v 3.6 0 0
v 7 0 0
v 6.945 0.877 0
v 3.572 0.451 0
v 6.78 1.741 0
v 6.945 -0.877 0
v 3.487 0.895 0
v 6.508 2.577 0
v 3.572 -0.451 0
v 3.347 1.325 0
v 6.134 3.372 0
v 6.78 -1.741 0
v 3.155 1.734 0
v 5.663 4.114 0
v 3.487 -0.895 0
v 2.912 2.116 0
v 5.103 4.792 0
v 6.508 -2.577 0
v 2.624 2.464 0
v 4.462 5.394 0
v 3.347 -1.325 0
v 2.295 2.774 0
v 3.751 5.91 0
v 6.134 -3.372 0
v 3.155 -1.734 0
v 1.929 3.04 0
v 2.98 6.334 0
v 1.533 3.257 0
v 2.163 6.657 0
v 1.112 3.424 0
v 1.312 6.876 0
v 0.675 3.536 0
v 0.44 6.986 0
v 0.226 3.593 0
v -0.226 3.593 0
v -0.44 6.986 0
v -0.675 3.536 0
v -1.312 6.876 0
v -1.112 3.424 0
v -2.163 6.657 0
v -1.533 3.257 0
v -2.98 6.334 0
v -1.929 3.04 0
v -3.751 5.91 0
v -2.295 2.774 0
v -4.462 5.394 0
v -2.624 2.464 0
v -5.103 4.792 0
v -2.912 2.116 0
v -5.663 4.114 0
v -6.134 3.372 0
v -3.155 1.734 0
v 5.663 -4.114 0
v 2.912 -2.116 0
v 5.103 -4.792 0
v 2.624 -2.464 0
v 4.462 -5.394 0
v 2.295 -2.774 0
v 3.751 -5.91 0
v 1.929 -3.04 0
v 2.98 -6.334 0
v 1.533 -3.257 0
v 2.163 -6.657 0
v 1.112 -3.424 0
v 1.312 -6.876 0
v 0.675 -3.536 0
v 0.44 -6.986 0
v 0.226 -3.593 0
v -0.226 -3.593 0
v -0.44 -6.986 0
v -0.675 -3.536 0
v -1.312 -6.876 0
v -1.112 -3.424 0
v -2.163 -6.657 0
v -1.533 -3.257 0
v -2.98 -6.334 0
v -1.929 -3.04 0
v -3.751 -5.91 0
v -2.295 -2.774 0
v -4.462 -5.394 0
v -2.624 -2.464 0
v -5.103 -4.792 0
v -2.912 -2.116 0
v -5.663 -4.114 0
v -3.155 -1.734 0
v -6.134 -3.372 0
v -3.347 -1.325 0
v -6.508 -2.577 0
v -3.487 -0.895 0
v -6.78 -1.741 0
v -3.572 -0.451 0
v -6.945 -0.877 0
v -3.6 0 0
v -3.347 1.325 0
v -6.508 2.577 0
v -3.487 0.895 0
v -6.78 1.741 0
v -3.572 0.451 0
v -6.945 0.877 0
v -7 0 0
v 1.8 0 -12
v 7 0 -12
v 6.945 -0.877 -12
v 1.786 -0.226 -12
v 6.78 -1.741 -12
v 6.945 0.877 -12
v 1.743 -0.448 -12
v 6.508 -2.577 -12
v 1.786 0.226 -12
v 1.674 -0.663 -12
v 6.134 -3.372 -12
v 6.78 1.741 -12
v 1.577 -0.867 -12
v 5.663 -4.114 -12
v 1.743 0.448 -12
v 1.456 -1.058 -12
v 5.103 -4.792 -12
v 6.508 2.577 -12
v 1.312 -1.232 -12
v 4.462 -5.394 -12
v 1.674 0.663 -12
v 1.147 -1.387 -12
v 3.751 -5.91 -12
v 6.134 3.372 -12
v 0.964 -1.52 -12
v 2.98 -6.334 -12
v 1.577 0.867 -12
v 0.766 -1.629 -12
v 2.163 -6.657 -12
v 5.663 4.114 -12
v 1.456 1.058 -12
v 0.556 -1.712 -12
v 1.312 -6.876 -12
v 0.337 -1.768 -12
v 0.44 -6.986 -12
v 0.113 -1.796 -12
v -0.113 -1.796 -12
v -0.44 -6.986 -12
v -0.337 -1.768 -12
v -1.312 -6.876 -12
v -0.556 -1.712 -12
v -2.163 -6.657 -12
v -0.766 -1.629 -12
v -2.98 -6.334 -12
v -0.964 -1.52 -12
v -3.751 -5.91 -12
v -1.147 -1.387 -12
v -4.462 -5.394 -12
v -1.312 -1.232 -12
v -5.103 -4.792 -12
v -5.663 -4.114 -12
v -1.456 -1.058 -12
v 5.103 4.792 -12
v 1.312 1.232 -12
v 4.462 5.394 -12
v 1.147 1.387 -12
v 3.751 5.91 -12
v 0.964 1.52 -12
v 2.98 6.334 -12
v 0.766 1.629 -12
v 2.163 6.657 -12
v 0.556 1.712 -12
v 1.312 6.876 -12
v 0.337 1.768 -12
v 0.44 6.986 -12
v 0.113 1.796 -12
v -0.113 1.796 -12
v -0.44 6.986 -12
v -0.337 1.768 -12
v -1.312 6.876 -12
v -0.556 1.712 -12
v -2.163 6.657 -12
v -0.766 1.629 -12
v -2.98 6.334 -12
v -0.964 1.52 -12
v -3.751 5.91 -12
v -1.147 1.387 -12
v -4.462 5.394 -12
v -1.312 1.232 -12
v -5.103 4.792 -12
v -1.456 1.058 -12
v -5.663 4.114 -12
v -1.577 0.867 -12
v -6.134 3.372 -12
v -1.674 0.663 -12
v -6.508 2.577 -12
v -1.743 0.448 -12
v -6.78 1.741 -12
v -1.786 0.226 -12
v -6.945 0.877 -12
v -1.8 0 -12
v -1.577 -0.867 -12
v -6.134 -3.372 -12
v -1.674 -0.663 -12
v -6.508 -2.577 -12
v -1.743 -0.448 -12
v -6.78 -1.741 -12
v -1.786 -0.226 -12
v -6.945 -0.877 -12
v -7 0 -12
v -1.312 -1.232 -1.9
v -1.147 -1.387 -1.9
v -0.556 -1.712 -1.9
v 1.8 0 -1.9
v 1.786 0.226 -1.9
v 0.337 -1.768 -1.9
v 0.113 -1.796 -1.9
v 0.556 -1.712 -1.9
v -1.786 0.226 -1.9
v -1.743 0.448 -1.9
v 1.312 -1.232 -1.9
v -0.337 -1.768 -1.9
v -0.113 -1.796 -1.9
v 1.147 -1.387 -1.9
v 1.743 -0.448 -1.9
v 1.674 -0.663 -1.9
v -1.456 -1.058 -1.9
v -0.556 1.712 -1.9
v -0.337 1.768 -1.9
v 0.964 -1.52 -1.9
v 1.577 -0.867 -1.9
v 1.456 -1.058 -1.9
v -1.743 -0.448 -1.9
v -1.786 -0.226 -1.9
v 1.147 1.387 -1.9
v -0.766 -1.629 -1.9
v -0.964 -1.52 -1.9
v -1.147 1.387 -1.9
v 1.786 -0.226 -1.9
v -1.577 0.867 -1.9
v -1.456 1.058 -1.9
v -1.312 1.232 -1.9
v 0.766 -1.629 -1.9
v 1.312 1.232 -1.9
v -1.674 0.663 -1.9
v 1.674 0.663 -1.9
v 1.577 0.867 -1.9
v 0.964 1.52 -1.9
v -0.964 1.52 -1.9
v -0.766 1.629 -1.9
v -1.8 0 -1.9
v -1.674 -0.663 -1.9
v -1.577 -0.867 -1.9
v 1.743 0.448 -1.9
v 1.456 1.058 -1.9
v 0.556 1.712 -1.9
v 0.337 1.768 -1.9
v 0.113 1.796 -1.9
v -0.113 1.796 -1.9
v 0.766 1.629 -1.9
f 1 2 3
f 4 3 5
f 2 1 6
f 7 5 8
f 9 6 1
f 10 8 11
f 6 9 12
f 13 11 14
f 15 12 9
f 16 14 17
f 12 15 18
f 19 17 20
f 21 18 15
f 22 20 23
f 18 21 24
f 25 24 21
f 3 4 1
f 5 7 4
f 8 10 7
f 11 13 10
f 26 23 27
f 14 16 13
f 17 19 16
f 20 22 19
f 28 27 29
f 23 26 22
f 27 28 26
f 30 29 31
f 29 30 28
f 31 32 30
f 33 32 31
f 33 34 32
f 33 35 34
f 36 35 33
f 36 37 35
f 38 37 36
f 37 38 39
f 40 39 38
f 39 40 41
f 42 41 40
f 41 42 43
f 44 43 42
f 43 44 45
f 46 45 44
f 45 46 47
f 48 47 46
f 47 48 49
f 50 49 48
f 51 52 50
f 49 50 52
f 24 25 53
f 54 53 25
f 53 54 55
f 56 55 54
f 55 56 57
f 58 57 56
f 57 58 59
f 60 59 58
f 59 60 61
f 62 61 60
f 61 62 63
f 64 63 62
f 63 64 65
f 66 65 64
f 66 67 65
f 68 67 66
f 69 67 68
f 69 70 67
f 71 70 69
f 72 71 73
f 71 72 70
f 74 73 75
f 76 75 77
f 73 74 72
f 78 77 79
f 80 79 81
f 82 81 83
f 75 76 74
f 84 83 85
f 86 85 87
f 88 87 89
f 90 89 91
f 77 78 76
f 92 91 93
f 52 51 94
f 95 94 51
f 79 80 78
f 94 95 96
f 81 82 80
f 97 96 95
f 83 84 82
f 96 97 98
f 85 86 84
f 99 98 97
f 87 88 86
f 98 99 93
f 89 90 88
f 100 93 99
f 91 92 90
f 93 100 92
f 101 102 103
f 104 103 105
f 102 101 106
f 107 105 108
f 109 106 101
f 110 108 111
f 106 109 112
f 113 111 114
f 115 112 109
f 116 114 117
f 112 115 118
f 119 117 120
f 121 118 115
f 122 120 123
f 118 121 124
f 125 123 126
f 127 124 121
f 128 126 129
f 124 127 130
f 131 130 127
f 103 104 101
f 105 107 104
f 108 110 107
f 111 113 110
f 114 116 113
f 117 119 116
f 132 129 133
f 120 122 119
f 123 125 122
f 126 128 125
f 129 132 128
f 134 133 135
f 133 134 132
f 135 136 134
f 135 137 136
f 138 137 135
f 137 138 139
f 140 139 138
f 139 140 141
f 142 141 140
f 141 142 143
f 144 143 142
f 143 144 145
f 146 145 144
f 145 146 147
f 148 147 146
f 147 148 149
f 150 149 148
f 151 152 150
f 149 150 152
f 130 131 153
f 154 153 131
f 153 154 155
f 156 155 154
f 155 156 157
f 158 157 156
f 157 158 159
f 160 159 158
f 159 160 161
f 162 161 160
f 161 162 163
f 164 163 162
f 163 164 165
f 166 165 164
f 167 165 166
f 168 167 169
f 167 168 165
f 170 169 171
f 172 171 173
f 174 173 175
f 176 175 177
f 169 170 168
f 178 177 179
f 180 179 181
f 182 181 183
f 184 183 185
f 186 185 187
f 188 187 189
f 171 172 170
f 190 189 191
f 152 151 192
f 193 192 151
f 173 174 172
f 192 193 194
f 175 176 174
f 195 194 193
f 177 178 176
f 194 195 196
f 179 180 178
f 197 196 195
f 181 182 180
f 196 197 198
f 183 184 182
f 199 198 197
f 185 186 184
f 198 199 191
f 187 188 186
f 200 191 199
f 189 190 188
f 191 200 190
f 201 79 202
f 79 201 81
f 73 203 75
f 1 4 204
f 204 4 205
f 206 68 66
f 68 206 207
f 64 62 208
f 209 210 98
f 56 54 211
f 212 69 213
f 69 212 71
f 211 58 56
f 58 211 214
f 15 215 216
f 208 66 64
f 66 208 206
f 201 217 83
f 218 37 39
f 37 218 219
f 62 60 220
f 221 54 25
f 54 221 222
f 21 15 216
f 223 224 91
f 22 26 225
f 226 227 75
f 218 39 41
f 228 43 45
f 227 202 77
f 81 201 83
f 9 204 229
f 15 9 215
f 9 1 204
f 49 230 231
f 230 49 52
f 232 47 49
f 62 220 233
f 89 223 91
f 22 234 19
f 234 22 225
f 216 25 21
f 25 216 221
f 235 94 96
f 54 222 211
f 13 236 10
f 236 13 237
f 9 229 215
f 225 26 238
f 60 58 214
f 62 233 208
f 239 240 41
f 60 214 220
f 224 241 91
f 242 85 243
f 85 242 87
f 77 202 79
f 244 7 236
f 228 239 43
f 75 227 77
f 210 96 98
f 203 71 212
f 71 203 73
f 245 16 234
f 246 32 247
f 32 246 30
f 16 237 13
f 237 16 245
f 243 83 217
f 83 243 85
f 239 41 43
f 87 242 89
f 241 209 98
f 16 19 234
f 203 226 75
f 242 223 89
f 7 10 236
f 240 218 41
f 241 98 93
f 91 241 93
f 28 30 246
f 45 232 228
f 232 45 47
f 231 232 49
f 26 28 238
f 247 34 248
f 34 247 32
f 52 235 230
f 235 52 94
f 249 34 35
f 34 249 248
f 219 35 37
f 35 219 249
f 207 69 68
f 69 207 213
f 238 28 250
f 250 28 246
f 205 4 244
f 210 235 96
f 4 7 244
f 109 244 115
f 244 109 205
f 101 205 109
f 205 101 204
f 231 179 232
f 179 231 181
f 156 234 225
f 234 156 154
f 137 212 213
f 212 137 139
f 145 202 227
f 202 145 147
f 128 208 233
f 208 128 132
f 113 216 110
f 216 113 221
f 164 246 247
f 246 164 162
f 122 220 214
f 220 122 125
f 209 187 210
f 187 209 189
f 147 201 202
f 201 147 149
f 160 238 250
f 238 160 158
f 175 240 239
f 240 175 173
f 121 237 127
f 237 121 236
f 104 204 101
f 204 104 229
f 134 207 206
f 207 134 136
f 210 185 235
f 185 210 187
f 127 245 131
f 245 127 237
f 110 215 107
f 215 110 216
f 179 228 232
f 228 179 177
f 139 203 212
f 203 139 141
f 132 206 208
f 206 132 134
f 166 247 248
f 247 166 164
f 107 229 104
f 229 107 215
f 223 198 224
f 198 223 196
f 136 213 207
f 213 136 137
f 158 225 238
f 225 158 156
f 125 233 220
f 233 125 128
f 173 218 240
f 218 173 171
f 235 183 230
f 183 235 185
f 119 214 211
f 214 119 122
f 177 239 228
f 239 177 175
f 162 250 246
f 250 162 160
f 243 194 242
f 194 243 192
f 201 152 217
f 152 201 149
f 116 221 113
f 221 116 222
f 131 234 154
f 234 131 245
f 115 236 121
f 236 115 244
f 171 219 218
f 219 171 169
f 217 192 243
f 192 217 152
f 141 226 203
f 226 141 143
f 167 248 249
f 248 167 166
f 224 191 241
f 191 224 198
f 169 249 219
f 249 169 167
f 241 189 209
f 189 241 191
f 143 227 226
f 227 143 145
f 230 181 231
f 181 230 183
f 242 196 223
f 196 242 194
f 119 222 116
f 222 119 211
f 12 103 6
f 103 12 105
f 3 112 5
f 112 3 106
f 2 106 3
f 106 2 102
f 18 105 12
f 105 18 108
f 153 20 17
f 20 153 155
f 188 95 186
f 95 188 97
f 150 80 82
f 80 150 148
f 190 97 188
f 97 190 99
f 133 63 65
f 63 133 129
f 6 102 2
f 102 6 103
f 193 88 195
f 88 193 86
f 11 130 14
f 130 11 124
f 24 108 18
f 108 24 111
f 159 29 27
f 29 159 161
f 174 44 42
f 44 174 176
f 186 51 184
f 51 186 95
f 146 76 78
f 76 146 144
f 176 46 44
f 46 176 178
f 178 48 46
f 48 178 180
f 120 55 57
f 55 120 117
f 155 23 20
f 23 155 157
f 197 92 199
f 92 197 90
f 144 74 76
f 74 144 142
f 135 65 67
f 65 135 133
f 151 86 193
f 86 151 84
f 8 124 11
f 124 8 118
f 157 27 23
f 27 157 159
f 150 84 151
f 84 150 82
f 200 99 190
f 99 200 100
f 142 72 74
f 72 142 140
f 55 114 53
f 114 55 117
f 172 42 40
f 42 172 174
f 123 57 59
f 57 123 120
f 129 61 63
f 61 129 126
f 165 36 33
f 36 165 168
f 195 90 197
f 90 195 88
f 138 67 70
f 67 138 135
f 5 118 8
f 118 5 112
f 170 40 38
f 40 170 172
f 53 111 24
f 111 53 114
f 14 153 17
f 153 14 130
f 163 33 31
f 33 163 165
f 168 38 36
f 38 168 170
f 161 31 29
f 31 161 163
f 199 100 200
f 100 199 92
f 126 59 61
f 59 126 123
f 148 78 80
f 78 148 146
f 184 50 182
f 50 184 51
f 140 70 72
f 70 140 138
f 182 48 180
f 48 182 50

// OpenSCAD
$fn = 50;


difference() {
	union() {
		translate(v = [0, 0, -12.0000000000]) {
			cylinder(h = 12, r = 7.0000000000);
		}
	}
	union() {
		translate(v = [0, 0, 0]) {
			rotate(a = [0, 0, 0]) {
				difference() {
					union() {
						translate(v = [0, 0, -12.0000000000]) {
							cylinder(h = 12, r = 1.5000000000);
						}
						translate(v = [0, 0, -1.9000000000]) {
							cylinder(h = 1.9000000000, r1 = 1.8000000000, r2 = 3.6000000000);
						}
						translate(v = [0, 0, -12.0000000000]) {
							cylinder(h = 12, r = 1.8000000000);
						}
						translate(v = [0, 0, -12.0000000000]) {
							cylinder(h = 12, r = 1.5000000000);
						}
					}
					union();
				}
			}
		}
	}
}
